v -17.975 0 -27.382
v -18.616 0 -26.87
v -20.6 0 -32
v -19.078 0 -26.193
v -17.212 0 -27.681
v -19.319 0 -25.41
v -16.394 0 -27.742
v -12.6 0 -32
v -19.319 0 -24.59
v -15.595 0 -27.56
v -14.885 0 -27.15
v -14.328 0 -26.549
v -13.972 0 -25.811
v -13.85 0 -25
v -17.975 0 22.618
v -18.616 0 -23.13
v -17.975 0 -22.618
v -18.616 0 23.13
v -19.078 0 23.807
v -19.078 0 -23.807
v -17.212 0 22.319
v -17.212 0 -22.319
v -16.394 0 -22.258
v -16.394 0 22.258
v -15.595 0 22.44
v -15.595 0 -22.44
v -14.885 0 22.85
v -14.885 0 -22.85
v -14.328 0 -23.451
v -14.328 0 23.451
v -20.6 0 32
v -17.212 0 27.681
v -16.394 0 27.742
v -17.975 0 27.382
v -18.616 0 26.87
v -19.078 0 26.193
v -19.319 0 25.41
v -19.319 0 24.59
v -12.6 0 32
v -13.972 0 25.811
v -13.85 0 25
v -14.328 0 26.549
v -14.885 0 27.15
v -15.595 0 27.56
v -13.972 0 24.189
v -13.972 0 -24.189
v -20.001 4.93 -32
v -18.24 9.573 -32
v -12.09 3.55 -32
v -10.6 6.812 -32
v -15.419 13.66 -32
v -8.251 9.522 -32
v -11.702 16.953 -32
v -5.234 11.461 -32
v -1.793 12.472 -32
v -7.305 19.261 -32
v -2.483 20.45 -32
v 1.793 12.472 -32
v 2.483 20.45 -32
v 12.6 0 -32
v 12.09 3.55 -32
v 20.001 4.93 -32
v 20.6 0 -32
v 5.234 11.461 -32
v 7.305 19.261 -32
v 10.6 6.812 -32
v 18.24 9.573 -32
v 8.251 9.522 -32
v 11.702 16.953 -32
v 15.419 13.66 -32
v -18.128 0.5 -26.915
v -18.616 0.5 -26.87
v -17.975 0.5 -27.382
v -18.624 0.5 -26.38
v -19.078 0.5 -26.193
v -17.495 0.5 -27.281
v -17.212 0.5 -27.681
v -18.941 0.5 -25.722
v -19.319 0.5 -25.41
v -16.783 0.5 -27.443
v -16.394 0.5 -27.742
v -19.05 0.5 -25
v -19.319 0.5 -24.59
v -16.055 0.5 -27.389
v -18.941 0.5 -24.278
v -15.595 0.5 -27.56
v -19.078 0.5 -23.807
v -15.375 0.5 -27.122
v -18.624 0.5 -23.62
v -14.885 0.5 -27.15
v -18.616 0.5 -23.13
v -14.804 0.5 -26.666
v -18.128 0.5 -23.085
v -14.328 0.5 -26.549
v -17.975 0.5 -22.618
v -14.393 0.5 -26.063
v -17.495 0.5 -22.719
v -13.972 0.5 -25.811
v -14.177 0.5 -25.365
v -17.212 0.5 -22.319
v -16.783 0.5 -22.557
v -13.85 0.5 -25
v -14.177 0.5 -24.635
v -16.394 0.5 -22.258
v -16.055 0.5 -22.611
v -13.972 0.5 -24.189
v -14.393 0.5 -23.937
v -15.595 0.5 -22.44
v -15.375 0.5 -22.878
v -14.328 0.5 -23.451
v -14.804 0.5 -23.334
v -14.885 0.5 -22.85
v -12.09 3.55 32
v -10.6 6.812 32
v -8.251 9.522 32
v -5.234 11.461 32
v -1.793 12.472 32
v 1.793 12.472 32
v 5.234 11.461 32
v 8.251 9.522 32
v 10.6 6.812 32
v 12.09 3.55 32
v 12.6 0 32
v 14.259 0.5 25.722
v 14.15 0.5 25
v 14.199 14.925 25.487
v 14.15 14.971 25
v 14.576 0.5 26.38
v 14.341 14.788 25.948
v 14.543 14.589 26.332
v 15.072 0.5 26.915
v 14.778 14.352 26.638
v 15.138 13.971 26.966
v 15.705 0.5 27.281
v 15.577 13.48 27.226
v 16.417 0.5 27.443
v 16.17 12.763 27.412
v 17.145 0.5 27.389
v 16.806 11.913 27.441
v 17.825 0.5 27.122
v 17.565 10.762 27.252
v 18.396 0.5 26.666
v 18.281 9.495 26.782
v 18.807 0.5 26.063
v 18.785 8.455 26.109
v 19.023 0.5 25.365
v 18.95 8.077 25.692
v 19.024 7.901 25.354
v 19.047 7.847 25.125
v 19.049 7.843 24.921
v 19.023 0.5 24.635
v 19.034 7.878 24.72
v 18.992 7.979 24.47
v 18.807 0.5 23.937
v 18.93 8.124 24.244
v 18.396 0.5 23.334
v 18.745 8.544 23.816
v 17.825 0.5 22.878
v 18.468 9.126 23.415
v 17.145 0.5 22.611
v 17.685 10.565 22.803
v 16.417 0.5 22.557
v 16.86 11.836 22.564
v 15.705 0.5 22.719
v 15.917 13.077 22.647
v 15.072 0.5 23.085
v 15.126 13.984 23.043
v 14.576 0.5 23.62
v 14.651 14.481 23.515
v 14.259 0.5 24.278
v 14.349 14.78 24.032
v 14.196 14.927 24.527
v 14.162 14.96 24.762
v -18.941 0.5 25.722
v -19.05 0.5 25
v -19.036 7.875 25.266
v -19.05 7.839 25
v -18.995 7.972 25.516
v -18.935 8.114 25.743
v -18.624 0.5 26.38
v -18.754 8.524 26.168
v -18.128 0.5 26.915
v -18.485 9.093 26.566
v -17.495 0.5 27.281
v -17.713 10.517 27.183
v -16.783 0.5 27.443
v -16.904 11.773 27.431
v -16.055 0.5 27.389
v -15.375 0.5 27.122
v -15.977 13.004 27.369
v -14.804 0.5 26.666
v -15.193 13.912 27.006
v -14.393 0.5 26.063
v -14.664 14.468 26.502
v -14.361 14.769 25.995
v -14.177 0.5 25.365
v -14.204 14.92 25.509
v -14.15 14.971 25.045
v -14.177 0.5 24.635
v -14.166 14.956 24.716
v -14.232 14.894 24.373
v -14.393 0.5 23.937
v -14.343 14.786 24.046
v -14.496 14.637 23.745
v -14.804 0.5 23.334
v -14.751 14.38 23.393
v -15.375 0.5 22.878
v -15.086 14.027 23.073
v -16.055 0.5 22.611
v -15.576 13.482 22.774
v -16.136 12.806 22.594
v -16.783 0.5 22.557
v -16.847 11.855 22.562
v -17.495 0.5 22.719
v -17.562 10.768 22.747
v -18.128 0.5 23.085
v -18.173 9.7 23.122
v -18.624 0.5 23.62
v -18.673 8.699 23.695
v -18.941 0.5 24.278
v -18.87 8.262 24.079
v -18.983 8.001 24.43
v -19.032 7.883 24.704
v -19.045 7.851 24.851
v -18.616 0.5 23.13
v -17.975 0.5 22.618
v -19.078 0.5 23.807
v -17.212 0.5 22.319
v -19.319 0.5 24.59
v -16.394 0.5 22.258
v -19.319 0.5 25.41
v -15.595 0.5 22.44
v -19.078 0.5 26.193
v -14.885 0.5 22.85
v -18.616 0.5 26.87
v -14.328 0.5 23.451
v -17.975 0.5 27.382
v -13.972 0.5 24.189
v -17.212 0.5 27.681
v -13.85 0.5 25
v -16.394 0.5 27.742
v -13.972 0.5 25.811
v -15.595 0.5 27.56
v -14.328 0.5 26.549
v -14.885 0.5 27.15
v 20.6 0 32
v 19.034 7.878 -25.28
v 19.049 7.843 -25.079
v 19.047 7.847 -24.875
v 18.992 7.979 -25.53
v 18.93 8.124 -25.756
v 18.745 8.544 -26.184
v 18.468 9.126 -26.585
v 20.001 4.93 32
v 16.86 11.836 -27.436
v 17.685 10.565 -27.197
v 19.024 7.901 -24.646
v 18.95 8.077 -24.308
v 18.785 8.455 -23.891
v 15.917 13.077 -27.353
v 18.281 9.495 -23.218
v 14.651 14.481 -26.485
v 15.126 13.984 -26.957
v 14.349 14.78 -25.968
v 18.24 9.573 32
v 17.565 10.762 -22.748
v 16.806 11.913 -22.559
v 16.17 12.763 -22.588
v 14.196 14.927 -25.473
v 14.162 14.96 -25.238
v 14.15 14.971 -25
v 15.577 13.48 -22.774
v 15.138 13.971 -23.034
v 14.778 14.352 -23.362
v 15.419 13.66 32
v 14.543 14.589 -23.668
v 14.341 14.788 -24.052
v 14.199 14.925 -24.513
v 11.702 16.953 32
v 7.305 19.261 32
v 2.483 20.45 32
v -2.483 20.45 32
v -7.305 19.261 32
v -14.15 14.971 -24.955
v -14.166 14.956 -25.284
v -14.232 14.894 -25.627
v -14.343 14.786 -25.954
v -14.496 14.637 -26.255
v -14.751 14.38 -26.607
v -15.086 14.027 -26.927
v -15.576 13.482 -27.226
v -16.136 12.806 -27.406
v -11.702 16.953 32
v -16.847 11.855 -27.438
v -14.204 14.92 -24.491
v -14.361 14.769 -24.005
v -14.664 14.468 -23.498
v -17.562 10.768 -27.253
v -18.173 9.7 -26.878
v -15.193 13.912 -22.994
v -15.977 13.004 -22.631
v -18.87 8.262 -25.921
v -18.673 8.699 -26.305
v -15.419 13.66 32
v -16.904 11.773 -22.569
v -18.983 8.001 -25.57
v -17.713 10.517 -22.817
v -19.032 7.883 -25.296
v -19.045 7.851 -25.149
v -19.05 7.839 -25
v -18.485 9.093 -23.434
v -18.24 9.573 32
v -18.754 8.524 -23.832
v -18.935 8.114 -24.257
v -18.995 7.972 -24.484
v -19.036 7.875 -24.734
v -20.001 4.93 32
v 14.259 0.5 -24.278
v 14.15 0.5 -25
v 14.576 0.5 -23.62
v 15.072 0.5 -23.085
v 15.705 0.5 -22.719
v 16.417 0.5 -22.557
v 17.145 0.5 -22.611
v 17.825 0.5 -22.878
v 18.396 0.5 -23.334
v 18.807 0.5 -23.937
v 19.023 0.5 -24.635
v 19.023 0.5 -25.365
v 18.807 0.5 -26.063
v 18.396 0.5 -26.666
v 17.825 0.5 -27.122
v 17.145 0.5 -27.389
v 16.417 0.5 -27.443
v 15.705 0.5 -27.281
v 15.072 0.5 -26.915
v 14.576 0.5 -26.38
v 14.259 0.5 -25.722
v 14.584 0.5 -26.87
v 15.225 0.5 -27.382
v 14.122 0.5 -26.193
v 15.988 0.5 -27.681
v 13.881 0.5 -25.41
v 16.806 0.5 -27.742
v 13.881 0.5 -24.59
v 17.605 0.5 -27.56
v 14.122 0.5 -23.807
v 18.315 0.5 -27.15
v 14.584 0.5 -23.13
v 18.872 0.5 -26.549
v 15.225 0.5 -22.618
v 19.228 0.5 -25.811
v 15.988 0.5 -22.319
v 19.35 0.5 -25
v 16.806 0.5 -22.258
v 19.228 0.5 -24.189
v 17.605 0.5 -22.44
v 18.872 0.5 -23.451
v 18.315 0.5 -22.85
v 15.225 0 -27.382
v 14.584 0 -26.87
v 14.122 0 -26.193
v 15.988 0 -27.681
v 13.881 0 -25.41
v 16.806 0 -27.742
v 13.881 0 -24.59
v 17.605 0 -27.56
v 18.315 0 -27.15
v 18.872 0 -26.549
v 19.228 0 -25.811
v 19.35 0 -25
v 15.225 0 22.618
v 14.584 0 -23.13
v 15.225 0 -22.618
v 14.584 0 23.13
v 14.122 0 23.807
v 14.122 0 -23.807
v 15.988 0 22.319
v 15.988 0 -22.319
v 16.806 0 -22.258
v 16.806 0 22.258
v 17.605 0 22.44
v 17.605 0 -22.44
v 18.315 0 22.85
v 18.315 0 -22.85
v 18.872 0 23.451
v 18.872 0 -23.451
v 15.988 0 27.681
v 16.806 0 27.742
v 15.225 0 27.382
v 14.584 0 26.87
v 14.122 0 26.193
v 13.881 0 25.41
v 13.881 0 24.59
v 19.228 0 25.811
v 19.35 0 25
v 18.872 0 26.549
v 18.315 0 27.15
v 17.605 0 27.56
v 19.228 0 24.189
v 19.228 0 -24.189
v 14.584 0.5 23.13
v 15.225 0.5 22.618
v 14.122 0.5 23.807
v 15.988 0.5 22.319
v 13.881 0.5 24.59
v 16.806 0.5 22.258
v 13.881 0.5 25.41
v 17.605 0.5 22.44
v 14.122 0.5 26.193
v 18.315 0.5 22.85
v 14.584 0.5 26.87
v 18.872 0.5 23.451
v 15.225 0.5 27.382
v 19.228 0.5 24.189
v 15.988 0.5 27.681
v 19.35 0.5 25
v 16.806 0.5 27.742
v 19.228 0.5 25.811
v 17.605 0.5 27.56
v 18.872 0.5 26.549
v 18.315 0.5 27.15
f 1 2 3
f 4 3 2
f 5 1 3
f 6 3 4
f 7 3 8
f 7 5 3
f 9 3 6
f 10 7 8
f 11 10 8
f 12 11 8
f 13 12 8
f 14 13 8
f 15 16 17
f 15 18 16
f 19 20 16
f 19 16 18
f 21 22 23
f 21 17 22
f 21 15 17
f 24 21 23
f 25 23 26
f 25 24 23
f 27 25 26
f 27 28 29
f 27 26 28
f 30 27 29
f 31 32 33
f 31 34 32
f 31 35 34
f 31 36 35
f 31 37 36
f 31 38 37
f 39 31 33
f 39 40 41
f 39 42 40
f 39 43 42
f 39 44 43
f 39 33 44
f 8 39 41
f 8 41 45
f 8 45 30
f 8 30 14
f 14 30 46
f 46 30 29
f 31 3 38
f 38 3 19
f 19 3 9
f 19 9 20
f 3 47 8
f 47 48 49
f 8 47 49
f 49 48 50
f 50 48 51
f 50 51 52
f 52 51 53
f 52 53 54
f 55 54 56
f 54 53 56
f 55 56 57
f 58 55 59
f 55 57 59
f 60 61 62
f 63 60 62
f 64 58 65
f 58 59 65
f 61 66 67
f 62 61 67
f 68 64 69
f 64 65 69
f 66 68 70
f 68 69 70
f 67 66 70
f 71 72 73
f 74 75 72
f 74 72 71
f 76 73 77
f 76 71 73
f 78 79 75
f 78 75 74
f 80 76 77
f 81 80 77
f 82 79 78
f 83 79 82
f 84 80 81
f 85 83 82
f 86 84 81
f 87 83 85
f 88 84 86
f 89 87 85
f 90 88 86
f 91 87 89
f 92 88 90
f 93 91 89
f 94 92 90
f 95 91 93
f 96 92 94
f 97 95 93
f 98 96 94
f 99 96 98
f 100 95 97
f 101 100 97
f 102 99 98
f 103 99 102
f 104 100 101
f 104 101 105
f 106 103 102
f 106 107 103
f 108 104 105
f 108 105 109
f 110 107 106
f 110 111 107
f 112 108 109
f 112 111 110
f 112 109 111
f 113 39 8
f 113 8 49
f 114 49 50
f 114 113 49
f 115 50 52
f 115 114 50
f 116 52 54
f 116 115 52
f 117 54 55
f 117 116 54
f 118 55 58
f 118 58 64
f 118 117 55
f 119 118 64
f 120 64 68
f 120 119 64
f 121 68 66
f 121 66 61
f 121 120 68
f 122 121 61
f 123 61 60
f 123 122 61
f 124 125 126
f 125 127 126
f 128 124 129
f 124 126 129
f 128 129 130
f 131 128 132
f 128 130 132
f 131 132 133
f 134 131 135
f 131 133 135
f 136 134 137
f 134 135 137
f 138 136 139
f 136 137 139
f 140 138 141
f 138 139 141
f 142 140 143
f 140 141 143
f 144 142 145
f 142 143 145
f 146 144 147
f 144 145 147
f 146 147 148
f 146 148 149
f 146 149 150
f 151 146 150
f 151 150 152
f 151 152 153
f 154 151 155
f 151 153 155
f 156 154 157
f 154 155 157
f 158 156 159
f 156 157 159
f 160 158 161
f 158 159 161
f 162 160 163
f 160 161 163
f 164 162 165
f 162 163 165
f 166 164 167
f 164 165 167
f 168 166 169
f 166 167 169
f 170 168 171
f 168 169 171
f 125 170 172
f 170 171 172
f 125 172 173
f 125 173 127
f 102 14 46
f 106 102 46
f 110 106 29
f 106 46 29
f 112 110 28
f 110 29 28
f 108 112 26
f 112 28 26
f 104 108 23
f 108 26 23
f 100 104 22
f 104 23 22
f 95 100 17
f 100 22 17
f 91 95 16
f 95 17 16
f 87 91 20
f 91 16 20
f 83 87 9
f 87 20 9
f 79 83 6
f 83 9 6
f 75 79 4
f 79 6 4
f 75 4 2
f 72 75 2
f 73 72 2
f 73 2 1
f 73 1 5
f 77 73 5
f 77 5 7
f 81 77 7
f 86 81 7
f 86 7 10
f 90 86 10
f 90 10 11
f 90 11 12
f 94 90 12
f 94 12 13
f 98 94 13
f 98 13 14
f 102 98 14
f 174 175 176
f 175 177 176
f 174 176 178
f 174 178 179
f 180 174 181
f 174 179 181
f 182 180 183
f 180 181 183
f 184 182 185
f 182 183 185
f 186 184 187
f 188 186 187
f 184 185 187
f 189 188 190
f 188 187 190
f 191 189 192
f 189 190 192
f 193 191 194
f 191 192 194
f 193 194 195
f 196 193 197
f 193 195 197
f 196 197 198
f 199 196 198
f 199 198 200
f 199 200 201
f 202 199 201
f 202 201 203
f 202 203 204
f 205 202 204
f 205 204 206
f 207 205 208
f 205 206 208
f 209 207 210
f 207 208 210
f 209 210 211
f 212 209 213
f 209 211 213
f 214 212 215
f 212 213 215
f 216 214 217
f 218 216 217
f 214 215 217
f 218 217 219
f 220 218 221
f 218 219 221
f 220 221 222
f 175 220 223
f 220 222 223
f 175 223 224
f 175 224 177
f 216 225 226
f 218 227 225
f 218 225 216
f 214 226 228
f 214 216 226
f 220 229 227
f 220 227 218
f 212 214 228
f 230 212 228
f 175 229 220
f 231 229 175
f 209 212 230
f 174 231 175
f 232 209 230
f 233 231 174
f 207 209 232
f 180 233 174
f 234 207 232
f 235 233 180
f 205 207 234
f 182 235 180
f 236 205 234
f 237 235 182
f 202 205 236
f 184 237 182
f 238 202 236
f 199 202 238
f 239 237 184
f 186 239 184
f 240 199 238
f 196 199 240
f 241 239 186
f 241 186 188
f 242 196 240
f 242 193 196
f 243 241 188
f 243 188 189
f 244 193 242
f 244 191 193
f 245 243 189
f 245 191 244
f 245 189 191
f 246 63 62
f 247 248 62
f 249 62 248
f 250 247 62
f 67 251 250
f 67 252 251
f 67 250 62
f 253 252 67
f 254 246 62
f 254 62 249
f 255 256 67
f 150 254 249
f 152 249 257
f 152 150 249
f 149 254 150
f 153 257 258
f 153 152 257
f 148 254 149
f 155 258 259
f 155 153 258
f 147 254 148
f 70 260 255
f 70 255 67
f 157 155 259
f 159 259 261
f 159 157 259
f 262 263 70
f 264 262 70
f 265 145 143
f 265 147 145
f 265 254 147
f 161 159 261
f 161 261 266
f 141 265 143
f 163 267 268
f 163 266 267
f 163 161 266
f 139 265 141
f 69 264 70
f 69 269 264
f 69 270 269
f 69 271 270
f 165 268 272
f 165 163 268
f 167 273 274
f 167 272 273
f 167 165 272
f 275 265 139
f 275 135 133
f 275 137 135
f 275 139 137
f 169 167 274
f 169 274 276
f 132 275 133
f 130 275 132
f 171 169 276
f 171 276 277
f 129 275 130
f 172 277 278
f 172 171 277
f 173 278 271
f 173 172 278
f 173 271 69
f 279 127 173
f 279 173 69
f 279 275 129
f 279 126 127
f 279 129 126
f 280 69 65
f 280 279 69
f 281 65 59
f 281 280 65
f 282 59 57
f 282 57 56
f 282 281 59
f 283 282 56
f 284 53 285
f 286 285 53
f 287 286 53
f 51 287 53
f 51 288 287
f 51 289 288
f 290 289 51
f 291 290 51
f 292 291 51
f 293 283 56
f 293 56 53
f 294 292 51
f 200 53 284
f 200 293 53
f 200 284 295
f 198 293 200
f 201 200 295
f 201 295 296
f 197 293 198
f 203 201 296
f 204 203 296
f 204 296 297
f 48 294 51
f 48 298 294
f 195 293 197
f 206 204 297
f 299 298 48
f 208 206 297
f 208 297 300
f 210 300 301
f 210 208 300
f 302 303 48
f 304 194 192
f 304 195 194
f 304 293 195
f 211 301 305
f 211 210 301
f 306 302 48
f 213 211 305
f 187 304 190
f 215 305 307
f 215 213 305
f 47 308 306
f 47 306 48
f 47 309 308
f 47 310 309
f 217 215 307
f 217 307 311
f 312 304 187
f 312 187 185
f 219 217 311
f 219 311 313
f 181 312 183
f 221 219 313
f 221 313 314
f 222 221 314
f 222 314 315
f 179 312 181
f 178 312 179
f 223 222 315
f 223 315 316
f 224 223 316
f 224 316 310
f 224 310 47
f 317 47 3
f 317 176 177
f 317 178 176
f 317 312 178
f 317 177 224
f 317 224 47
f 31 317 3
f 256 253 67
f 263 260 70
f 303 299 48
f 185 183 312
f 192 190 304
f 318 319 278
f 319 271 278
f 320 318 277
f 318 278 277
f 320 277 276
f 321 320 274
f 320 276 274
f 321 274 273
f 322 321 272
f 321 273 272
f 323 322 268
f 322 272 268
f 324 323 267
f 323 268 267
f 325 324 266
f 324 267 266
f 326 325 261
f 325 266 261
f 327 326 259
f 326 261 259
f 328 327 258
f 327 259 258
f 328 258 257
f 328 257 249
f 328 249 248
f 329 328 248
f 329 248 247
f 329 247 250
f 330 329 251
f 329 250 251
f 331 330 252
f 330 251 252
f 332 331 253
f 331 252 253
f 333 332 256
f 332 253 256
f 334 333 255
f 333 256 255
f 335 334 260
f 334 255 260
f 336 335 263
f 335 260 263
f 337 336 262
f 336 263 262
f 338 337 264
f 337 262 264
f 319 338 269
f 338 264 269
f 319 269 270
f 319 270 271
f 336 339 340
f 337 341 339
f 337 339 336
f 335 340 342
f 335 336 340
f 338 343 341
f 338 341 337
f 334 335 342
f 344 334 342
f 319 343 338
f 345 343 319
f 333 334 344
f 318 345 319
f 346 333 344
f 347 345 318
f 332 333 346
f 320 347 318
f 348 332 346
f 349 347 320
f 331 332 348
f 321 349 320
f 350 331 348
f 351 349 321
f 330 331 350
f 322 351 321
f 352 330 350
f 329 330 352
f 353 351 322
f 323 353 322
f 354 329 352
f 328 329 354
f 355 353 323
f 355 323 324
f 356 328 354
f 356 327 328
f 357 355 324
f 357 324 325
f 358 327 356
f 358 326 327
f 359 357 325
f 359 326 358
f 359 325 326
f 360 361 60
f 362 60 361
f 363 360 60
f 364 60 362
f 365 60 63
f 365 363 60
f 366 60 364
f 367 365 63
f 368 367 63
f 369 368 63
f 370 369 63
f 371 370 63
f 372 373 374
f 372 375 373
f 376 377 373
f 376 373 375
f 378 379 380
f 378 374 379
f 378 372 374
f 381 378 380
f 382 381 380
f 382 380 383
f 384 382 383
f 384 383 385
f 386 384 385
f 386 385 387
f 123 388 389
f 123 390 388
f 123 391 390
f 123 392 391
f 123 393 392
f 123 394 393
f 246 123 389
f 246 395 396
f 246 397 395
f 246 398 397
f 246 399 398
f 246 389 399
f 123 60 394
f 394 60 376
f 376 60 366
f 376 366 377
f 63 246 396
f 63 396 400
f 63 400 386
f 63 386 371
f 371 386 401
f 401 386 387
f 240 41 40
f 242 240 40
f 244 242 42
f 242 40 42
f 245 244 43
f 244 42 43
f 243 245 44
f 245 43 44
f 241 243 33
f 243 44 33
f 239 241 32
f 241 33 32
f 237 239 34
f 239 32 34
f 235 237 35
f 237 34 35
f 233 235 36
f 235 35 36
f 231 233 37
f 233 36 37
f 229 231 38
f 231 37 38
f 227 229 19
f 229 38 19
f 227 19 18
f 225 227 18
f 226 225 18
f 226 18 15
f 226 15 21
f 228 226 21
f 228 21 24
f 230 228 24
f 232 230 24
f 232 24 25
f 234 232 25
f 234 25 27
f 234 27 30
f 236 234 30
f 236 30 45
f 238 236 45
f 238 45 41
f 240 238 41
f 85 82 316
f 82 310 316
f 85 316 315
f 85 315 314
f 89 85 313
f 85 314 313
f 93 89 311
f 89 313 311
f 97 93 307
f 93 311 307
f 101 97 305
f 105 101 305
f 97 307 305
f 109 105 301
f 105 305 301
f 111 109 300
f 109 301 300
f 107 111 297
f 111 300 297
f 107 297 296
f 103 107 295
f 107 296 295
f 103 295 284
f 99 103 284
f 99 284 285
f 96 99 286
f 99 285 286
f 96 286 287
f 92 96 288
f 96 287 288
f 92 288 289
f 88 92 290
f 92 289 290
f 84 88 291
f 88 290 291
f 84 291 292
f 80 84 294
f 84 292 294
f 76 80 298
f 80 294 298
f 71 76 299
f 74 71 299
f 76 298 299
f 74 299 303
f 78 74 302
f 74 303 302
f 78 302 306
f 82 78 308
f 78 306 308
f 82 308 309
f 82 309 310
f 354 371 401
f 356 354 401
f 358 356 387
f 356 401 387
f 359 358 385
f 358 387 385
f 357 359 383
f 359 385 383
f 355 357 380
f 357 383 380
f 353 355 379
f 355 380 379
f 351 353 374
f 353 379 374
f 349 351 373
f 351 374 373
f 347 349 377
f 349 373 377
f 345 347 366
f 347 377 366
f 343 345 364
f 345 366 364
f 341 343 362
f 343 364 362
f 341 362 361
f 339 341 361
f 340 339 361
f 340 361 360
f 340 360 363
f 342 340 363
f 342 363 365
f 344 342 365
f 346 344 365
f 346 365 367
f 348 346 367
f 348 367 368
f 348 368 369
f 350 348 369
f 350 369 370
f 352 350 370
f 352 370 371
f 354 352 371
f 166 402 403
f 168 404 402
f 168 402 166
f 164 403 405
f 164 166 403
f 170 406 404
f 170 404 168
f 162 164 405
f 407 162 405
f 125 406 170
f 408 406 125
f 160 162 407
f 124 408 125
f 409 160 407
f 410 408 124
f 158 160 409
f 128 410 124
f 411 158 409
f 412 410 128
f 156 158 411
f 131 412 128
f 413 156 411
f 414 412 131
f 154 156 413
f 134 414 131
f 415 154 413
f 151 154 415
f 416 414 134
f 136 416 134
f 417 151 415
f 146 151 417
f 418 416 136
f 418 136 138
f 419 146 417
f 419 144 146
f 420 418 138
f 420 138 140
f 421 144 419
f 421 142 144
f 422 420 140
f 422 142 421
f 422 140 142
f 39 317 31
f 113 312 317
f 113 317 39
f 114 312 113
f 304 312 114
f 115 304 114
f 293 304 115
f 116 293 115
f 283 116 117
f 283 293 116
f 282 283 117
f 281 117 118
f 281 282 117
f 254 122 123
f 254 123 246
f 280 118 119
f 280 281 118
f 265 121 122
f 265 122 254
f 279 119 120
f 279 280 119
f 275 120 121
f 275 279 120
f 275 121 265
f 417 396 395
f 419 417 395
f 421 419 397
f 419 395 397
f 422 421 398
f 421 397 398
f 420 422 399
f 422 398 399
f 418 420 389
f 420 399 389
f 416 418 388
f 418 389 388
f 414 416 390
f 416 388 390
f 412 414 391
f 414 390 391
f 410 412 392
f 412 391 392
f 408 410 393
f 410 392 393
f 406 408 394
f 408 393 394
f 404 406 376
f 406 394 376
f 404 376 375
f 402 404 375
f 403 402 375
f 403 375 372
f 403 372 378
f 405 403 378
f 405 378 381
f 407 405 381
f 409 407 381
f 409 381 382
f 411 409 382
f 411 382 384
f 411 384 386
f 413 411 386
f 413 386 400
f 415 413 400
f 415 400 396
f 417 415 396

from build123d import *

# Parameters (mm, degrees)
BOSS_EXTRUDE1_DEPTH            = 32
CBORE_FOR_M3_SHCS1_D           = 4.9
CBORE_FOR_M3_SHCS1_CBORE_D     = 5.5
CBORE_FOR_M3_SHCS1_CBORE_DEPTH = 0.5


with BuildPart() as part:
    # Sketch1 → Boss-Extrude1 (new, symmetric)
    with BuildSketch(Plane.XY):
        with BuildLine():
            Line((-20.6, 0), (-12.6, 0))
            ThreePointArc((-12.6, 0), (0, 12.6), (12.6, 0))
            Line((12.6, 0), (20.6, 0))
            ThreePointArc((20.6, 0), (0, 20.6), (-20.6, 0))
        make_face()
    extrude(amount=BOSS_EXTRUDE1_DEPTH, both=True)

    # CBORE for M3 SHCS1 (through all)
    with Locations(Plane.XZ):
        with Locations((-16.6, -25), (16.6, 25), (-16.6, 25), (16.6, -25)):
            CounterBoreHole(CBORE_FOR_M3_SHCS1_D / 2, CBORE_FOR_M3_SHCS1_CBORE_D / 2, CBORE_FOR_M3_SHCS1_CBORE_DEPTH)


solid = part.part
